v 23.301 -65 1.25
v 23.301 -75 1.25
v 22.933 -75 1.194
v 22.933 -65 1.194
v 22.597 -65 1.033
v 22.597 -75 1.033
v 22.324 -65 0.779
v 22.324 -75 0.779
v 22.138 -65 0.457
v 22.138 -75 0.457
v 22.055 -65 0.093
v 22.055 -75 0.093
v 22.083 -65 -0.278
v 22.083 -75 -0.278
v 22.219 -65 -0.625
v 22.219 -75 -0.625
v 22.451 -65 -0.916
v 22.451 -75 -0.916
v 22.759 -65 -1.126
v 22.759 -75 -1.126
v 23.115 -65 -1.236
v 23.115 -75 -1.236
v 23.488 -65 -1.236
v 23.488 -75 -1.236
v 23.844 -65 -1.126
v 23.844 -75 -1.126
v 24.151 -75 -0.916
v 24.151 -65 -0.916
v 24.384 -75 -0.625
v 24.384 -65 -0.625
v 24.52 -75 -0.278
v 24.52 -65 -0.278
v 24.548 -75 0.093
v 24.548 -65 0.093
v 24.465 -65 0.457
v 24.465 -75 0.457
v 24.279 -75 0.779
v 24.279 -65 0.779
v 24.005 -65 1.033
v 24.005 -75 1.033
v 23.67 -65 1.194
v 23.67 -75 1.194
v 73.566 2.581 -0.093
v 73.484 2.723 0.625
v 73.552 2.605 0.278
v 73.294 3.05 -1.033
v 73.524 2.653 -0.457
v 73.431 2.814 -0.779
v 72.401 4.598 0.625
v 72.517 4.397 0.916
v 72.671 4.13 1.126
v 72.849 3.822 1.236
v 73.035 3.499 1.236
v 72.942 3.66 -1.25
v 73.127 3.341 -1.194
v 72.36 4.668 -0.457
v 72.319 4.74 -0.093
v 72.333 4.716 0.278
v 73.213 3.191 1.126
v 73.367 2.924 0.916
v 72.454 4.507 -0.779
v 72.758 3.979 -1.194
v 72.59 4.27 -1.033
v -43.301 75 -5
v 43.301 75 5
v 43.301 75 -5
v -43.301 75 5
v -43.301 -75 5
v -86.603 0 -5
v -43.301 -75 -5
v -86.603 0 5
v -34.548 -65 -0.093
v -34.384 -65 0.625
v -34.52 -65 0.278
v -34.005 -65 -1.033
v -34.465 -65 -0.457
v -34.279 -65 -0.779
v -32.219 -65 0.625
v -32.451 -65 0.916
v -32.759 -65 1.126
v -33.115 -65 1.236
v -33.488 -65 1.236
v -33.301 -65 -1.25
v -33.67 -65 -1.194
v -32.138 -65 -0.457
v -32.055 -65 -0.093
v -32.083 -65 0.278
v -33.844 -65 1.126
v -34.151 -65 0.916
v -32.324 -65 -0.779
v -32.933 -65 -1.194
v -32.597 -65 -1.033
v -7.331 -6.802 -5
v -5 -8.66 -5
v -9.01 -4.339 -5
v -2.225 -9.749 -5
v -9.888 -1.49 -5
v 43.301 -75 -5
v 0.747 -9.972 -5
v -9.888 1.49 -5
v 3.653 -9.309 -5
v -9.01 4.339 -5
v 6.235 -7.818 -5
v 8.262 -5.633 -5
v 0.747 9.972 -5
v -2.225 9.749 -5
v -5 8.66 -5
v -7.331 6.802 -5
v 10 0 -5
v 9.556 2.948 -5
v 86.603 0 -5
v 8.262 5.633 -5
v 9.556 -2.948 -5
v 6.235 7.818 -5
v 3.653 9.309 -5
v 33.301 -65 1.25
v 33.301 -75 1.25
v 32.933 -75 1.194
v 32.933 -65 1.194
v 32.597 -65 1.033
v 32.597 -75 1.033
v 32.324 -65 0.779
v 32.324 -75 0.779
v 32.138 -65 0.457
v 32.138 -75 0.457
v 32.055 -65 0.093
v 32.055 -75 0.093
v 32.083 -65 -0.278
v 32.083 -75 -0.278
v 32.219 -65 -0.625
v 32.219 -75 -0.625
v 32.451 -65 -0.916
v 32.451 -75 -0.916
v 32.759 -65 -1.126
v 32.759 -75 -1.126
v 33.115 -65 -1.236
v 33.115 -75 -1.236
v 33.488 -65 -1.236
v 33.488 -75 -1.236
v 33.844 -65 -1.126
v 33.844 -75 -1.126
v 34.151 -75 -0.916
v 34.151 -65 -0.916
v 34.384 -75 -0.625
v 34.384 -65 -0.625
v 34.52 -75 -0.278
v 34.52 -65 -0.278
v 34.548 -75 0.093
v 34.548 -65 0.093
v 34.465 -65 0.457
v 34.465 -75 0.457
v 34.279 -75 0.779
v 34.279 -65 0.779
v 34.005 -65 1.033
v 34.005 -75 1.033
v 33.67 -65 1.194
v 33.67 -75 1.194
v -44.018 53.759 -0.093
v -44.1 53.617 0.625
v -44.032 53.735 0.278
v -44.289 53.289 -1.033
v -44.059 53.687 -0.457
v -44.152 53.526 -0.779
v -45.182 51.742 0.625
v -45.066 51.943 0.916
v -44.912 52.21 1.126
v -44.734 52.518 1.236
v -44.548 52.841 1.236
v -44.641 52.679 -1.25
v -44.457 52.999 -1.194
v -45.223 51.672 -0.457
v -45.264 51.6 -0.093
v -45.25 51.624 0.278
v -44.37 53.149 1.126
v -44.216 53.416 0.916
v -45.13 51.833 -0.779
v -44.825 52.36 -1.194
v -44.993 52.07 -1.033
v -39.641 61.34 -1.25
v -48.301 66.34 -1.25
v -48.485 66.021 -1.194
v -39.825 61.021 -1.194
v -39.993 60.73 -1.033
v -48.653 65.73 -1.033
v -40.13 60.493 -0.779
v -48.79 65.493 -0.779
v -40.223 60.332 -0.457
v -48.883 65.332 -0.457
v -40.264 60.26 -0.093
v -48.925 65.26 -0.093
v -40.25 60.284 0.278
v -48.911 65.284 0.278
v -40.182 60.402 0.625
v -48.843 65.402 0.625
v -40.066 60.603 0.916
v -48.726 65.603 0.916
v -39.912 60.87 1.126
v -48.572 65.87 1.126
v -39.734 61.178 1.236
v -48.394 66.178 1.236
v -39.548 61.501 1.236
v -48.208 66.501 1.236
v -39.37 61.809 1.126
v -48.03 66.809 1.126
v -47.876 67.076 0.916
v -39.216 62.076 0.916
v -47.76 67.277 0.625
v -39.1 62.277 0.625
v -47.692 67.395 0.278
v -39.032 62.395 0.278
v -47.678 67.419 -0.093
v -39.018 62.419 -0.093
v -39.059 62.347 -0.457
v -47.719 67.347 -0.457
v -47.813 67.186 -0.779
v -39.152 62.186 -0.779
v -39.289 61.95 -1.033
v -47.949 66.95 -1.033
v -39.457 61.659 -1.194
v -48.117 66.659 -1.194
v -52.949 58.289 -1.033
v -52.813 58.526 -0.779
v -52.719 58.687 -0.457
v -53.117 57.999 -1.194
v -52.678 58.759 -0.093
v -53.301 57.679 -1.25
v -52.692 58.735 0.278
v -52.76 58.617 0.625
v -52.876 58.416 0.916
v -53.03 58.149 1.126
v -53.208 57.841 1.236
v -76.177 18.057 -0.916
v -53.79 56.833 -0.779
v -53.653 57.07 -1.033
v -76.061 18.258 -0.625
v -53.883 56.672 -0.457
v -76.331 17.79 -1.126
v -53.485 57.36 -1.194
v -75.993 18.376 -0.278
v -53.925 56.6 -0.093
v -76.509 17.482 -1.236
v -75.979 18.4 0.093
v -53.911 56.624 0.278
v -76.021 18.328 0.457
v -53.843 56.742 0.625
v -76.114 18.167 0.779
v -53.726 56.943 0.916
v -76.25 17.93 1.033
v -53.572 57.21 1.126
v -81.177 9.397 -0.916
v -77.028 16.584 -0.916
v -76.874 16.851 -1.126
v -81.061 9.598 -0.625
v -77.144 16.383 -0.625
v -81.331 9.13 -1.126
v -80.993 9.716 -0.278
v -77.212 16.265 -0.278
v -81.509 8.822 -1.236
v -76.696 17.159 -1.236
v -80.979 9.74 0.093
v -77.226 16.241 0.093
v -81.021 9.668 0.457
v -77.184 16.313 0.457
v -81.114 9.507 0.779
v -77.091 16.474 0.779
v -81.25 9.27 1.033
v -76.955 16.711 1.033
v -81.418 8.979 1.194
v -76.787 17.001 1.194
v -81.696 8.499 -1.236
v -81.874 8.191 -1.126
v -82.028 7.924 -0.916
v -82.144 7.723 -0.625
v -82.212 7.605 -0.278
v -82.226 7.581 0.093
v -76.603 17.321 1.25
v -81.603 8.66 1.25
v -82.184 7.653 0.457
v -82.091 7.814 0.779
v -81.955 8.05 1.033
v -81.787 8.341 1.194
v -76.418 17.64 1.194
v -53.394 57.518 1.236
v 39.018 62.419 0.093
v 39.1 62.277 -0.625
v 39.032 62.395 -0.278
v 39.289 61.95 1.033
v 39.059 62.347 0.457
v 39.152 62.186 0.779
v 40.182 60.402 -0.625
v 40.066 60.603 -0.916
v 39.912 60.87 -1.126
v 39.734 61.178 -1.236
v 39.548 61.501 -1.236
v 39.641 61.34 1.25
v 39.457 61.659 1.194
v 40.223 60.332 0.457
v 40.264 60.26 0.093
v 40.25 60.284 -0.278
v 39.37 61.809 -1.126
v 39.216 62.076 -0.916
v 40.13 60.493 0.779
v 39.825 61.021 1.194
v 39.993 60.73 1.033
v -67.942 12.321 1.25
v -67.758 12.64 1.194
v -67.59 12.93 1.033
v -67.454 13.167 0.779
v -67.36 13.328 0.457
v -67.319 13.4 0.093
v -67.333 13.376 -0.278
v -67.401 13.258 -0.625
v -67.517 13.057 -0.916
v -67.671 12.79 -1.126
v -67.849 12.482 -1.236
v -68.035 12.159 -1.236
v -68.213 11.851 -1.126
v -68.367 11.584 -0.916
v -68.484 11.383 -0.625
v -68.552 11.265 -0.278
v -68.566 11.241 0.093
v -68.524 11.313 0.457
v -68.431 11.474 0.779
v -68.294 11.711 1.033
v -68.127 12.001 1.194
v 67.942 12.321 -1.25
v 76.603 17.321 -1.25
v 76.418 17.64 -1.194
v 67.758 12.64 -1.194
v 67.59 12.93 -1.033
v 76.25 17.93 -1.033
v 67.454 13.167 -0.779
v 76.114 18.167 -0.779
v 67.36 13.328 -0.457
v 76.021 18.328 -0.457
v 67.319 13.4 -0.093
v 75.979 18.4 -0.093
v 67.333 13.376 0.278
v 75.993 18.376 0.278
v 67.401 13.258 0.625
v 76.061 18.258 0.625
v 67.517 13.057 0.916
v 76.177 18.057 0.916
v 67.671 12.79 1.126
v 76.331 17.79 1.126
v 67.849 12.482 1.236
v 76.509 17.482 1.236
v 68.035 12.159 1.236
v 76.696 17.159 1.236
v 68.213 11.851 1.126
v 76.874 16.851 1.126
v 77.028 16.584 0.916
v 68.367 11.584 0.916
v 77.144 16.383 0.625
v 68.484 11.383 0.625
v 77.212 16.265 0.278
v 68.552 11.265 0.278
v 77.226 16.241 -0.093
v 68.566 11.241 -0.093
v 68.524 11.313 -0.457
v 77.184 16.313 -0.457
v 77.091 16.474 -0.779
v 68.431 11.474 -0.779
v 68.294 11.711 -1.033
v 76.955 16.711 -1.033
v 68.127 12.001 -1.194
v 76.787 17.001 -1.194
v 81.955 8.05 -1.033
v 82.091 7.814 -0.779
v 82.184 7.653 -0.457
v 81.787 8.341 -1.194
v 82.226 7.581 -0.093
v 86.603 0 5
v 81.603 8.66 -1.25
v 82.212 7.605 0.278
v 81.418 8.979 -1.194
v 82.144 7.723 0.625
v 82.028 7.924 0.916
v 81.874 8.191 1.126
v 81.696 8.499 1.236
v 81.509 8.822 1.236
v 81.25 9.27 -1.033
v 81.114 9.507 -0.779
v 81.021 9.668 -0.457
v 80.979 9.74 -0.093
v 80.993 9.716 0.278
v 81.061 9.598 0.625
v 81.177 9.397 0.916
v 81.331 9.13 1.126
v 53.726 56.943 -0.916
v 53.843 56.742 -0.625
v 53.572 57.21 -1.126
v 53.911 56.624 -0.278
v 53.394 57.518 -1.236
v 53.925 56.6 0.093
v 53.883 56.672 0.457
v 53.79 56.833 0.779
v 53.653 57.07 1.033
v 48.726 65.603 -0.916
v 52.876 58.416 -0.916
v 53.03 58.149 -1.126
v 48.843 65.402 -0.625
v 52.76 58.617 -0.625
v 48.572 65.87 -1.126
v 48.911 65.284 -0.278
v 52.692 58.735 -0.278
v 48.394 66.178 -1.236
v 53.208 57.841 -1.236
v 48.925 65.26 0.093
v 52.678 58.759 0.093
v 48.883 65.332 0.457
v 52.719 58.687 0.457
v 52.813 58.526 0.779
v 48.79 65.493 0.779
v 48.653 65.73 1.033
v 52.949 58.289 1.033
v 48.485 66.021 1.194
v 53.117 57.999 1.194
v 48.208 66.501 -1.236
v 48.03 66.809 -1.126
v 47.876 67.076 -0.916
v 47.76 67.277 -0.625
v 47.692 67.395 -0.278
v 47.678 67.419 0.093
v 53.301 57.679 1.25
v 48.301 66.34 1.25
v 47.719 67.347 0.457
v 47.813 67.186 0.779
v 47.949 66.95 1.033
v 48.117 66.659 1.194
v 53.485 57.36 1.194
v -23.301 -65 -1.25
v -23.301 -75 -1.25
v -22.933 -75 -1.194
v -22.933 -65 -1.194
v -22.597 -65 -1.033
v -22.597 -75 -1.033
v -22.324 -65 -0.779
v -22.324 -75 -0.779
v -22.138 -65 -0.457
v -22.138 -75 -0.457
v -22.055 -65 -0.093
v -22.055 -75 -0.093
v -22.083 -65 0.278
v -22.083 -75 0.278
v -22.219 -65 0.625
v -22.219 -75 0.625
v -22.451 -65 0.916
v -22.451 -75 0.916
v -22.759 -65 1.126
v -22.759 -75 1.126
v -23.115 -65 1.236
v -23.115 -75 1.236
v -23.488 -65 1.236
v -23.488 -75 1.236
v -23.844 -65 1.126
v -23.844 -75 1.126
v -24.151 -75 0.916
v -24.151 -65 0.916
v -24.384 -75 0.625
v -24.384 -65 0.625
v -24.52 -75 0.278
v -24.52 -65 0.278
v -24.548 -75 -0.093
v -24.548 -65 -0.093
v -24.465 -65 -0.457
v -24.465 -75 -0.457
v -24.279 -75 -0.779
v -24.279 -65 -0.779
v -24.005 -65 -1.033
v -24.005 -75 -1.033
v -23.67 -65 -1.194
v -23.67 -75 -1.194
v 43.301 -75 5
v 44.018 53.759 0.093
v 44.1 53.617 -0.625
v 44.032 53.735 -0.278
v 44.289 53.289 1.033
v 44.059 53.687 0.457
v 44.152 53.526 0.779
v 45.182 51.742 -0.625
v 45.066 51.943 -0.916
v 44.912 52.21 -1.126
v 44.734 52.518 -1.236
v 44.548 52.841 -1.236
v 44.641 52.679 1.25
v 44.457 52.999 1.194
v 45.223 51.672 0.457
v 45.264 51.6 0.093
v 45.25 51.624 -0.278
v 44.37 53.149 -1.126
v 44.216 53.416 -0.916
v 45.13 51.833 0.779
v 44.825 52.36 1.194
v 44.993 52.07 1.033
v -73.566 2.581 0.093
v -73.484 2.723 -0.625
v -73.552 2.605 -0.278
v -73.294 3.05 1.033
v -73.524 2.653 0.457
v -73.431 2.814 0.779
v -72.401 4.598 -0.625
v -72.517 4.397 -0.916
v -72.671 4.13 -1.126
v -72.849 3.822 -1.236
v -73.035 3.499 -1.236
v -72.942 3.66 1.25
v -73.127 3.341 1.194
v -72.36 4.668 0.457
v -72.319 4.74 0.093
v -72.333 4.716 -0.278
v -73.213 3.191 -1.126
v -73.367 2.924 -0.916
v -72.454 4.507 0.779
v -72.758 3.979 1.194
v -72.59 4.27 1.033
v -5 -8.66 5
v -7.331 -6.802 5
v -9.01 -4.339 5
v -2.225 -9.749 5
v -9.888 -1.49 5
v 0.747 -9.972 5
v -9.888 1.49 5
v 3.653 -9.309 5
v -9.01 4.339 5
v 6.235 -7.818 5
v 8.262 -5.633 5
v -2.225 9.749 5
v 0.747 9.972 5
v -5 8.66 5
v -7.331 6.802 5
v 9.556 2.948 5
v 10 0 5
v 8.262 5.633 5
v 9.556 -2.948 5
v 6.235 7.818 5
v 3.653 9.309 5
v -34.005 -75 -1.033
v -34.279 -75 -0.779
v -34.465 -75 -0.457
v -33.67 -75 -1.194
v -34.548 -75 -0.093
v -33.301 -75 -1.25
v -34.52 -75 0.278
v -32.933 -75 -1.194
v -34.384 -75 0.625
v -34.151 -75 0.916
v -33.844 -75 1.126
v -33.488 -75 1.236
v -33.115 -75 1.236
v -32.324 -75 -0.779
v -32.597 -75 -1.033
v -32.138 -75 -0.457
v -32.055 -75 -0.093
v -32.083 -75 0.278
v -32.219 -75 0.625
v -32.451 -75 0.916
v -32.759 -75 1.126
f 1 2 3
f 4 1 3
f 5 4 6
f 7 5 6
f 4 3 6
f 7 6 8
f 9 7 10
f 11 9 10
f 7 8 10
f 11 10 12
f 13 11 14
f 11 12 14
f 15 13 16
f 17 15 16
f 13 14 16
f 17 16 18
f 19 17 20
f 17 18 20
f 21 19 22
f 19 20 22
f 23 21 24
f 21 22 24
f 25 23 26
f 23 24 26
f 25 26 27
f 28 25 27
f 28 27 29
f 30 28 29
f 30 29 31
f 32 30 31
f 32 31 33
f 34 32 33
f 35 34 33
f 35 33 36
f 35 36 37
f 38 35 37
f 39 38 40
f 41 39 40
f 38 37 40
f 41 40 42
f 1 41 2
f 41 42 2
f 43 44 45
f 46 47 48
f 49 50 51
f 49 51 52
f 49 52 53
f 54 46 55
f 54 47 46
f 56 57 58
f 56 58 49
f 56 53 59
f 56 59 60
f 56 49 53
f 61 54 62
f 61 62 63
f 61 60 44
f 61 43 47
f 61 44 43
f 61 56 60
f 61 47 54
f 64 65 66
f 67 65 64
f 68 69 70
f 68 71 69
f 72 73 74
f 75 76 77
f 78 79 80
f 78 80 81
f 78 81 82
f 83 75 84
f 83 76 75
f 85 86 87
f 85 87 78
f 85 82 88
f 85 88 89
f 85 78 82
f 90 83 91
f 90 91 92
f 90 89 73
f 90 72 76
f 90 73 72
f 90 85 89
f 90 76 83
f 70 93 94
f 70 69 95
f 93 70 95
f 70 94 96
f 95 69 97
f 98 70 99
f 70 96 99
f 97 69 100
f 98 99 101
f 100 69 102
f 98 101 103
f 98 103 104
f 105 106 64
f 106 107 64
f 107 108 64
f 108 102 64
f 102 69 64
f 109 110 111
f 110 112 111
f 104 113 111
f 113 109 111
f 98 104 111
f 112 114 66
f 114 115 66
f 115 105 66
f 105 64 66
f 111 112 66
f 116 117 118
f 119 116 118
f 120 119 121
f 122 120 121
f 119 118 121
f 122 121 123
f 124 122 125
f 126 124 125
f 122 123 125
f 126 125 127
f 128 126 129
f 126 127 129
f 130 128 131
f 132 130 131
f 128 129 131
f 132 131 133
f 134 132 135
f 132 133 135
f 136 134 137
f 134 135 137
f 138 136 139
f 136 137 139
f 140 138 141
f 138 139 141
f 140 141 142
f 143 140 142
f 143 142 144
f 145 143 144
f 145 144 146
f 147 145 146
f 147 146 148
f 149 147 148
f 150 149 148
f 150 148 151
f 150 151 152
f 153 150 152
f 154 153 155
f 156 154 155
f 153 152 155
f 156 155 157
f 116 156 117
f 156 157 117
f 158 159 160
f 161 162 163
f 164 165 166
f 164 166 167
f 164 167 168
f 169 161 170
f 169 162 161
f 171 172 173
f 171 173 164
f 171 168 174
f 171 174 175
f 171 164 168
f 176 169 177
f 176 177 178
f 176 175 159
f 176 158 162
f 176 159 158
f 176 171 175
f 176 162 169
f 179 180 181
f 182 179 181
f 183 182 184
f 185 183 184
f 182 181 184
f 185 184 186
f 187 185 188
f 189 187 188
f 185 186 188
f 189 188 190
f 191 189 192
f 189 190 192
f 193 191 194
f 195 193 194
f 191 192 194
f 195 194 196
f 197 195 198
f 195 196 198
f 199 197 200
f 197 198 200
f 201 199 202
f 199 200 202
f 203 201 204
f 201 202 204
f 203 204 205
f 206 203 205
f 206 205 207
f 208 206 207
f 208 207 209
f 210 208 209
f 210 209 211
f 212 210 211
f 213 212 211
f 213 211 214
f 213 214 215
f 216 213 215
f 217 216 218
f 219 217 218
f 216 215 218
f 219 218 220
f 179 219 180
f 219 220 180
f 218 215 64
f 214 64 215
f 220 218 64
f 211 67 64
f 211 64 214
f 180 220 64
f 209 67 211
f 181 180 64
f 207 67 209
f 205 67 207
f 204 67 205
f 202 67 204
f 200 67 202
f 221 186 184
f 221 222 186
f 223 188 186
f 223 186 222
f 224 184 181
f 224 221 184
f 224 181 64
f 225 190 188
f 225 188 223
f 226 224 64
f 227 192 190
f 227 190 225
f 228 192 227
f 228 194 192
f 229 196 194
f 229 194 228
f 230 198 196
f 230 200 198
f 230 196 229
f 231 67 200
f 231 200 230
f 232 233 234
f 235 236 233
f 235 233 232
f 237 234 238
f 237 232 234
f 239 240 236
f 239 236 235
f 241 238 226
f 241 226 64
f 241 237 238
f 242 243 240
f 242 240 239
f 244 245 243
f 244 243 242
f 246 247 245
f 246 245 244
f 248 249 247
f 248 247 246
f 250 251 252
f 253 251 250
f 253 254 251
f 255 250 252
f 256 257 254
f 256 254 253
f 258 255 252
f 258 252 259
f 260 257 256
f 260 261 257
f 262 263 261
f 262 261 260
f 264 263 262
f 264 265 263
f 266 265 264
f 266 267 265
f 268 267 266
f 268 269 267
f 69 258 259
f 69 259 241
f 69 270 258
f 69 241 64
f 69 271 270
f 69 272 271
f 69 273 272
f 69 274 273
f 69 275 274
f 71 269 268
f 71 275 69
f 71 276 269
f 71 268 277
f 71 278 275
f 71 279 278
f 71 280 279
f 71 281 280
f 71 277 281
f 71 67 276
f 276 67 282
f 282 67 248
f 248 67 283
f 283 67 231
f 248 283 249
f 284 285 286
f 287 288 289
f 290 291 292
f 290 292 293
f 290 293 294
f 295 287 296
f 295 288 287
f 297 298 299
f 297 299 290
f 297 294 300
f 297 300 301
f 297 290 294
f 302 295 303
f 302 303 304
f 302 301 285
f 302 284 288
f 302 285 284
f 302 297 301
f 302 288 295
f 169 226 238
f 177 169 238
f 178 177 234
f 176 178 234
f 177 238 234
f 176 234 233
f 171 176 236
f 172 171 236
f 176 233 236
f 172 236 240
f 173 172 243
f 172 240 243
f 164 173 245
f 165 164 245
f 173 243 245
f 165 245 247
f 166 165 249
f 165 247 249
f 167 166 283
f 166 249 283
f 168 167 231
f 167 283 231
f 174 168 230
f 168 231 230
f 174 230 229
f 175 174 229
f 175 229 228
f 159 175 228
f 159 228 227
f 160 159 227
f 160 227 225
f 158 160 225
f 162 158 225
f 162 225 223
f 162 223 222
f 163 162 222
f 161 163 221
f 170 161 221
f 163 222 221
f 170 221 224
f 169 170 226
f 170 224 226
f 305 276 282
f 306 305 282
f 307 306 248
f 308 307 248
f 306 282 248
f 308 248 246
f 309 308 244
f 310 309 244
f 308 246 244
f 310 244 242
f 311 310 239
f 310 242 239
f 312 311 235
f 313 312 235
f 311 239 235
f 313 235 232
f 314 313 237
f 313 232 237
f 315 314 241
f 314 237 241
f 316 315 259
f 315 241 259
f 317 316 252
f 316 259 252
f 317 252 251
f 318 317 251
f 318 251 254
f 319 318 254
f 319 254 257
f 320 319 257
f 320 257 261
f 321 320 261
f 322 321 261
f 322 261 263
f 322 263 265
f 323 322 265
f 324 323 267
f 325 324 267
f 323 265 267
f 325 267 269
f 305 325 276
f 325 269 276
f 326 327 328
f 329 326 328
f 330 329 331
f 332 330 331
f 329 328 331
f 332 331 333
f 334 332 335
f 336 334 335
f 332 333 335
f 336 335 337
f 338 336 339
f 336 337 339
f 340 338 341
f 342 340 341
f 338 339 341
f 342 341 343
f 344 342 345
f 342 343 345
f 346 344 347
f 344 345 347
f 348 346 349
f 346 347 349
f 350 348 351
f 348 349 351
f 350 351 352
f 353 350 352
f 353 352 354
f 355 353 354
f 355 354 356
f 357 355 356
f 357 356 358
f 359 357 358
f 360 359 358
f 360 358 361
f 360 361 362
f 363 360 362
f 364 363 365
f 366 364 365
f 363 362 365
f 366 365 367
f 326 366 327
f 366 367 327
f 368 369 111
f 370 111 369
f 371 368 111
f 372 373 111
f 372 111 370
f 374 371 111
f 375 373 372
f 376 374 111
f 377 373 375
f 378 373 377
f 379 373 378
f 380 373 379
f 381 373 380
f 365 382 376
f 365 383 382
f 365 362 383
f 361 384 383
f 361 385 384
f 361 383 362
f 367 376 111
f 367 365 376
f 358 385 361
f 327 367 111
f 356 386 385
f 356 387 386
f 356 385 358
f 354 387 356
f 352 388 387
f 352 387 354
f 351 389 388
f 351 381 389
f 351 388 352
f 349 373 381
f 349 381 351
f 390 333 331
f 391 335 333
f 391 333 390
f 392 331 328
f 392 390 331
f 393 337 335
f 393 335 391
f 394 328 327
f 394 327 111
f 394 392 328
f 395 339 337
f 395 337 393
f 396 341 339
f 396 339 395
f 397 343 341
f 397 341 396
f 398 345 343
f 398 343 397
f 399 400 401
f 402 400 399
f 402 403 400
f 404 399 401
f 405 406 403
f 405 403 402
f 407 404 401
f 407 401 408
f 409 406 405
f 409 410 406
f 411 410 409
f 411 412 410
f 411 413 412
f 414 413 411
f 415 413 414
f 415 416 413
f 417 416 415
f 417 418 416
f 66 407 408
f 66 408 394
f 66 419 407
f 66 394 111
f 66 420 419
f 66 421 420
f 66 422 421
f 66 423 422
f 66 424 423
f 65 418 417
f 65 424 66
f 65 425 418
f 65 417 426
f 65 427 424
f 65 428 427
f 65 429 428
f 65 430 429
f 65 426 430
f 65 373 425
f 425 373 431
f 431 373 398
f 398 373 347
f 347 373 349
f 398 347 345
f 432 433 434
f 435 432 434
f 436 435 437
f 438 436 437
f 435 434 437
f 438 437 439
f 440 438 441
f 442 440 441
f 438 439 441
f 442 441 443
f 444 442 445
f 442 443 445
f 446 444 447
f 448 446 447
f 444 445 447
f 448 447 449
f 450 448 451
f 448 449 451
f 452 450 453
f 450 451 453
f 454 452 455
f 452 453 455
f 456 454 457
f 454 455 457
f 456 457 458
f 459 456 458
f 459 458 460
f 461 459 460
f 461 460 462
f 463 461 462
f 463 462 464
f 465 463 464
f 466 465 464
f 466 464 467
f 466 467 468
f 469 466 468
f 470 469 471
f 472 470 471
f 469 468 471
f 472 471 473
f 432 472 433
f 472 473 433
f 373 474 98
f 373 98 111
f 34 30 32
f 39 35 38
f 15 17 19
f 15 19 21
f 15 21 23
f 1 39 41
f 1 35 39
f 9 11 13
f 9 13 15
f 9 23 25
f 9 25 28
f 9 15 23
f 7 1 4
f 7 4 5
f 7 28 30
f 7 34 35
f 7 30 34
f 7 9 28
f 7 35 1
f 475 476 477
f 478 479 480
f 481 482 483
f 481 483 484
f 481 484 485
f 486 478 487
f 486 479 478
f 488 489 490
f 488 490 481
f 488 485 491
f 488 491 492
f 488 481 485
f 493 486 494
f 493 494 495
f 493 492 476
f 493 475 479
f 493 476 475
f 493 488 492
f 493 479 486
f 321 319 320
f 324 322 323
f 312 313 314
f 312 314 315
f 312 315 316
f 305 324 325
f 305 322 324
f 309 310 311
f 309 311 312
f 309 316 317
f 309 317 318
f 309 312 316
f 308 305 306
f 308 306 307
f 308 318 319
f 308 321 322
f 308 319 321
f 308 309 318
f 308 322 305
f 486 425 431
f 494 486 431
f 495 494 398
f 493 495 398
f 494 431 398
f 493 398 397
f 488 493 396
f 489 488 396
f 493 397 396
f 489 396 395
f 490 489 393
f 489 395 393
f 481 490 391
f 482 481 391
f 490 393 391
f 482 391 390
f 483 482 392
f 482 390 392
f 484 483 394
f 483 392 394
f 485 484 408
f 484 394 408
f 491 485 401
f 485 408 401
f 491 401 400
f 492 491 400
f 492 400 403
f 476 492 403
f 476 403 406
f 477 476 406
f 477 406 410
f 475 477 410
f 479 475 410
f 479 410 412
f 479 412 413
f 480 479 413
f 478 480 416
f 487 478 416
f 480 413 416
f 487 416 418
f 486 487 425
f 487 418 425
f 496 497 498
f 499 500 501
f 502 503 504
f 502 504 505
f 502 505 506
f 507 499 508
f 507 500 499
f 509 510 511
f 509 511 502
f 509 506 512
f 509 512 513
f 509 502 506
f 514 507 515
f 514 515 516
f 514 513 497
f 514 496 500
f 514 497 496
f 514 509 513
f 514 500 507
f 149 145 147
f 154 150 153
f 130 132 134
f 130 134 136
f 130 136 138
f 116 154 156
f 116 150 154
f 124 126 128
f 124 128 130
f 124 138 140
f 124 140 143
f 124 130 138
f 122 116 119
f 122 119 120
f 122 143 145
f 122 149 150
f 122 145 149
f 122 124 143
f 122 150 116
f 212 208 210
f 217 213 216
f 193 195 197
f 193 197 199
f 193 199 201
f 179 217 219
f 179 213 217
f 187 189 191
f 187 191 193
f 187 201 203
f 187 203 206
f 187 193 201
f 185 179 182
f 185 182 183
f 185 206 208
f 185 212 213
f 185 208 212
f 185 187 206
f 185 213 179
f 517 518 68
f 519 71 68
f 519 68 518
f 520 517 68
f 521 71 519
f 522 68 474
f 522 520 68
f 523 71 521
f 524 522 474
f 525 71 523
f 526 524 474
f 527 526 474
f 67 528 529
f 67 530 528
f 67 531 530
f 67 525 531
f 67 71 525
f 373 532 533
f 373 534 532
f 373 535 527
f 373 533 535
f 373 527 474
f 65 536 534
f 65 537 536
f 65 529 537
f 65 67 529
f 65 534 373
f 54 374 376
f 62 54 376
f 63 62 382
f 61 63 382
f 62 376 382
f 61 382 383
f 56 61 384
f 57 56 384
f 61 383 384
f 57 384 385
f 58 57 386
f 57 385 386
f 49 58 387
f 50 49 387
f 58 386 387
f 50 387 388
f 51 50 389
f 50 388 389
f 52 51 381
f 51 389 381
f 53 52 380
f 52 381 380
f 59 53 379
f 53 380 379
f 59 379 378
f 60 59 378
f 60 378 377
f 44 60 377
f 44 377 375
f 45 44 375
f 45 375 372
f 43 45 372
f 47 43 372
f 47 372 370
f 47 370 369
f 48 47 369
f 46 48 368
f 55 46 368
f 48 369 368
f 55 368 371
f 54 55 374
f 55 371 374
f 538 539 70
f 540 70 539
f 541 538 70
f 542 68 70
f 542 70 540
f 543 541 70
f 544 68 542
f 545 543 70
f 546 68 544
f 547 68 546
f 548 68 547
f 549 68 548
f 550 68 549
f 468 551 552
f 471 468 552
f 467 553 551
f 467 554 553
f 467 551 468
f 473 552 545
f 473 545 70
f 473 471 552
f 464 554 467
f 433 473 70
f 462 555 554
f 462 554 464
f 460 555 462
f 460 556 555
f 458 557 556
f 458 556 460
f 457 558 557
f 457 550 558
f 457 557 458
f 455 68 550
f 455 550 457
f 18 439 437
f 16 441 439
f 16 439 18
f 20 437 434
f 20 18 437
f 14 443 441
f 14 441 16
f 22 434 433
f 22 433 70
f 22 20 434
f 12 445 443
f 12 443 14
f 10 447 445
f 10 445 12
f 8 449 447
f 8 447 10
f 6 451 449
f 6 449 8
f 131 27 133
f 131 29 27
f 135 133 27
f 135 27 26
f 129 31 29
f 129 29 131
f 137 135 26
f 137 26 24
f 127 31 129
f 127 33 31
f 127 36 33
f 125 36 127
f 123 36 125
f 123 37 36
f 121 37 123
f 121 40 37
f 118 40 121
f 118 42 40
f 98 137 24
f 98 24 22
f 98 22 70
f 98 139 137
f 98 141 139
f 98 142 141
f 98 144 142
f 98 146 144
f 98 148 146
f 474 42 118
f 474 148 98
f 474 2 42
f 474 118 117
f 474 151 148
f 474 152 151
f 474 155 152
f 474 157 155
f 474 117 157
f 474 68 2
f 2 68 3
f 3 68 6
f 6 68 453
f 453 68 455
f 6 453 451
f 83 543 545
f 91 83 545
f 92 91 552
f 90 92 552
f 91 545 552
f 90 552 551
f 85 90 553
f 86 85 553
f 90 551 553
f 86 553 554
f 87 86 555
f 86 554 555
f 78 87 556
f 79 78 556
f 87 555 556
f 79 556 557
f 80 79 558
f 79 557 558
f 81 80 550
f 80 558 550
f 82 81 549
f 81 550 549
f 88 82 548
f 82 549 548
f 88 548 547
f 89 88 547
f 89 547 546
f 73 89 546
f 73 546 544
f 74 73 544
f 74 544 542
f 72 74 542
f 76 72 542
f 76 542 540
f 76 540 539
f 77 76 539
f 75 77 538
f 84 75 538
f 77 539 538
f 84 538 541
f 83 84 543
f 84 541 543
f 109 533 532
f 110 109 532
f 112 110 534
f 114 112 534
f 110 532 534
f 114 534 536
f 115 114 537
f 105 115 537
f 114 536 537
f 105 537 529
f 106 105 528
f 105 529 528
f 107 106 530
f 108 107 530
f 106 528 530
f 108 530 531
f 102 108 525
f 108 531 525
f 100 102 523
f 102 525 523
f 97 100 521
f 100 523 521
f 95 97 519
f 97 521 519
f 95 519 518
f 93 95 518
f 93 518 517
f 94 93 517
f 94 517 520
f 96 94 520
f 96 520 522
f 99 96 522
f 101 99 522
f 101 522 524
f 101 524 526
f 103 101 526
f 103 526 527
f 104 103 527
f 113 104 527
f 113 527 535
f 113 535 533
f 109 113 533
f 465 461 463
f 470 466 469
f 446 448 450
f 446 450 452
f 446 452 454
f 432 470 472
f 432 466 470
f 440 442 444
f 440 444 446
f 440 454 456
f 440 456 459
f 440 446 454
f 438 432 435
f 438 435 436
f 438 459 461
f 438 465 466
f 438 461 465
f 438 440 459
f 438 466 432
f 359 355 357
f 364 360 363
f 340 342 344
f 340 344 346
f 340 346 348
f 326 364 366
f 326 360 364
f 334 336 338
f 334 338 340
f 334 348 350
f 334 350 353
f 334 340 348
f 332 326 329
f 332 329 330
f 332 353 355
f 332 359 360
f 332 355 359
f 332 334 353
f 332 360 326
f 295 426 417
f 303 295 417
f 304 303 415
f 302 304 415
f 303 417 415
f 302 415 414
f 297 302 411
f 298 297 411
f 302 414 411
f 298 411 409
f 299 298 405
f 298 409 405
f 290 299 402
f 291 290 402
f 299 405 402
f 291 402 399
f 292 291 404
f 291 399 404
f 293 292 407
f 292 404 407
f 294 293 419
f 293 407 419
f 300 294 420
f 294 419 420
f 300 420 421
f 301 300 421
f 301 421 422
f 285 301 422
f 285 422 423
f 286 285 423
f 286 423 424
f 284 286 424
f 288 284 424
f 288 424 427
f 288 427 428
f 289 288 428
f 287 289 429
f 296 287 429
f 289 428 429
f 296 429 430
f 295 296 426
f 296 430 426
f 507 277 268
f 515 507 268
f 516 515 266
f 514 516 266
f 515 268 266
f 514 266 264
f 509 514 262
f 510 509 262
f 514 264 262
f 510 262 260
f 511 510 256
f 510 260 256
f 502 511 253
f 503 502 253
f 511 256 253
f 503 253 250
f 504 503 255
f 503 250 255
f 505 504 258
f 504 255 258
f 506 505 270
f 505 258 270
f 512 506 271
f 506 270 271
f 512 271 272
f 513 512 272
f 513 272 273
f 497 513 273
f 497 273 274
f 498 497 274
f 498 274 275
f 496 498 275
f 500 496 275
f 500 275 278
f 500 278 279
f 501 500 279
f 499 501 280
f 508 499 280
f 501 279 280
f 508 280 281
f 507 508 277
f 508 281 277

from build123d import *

# Parameters (mm, degrees)
BOSS_EXTRUDE1_DEPTH = 5
SKETCH2_R           = 1.25
CUT_EXTRUDE1_DEPTH  = 10
SKETCH3_R           = 10
CUT_EXTRUDE2_DEPTH  = 116
CIRPATTERN1_COUNT   = 3


with BuildPart() as part:
    # Sketch1 → Boss-Extrude1 (new, symmetric)
    with BuildSketch(Plane.XY):
        Polygon((-43.301270189, -75), (43.301270189, -75), (86.602540378, 0), (43.301270189, 75), (-43.301270189, 75), (-86.602540378, 0), align=None)
    extrude(amount=BOSS_EXTRUDE1_DEPTH, both=True)

    # Sketch2 → Cut-Extrude1 (cut)
    with BuildSketch(Plane.XZ.offset(75)):
        with Locations(Location((-33.301270189, 0, 0), (0, 0, 270))):
            Circle(SKETCH2_R)
        with Locations(Location((-23.301270189, 0, 0), (0, 0, 270))):
            Circle(SKETCH2_R)
        with Locations(Location((23.301270189, 0, 0), (0, 0, 90))):
            Circle(SKETCH2_R)
        with Locations(Location((33.301270189, 0, 0), (0, 0, 90))):
            Circle(SKETCH2_R)
    cut_extrude1 = extrude(amount=-CUT_EXTRUDE1_DEPTH, mode=Mode.SUBTRACT)

    # Sketch3 → Cut-Extrude2 (cut, through all)
    with BuildSketch(Plane.XY.offset(5)):
        Circle(SKETCH3_R)
    extrude(amount=-CUT_EXTRUDE2_DEPTH, mode=Mode.SUBTRACT)

    # CirPattern1: Cut-Extrude1 ×3 about axis
    cirpattern1_axis = Axis((0, 0, 0), (0, 0, 1))
    for i in range(1, CIRPATTERN1_COUNT):
        add(cut_extrude1.rotate(cirpattern1_axis, i * 360 / CIRPATTERN1_COUNT), mode=Mode.SUBTRACT)


solid = part.part
